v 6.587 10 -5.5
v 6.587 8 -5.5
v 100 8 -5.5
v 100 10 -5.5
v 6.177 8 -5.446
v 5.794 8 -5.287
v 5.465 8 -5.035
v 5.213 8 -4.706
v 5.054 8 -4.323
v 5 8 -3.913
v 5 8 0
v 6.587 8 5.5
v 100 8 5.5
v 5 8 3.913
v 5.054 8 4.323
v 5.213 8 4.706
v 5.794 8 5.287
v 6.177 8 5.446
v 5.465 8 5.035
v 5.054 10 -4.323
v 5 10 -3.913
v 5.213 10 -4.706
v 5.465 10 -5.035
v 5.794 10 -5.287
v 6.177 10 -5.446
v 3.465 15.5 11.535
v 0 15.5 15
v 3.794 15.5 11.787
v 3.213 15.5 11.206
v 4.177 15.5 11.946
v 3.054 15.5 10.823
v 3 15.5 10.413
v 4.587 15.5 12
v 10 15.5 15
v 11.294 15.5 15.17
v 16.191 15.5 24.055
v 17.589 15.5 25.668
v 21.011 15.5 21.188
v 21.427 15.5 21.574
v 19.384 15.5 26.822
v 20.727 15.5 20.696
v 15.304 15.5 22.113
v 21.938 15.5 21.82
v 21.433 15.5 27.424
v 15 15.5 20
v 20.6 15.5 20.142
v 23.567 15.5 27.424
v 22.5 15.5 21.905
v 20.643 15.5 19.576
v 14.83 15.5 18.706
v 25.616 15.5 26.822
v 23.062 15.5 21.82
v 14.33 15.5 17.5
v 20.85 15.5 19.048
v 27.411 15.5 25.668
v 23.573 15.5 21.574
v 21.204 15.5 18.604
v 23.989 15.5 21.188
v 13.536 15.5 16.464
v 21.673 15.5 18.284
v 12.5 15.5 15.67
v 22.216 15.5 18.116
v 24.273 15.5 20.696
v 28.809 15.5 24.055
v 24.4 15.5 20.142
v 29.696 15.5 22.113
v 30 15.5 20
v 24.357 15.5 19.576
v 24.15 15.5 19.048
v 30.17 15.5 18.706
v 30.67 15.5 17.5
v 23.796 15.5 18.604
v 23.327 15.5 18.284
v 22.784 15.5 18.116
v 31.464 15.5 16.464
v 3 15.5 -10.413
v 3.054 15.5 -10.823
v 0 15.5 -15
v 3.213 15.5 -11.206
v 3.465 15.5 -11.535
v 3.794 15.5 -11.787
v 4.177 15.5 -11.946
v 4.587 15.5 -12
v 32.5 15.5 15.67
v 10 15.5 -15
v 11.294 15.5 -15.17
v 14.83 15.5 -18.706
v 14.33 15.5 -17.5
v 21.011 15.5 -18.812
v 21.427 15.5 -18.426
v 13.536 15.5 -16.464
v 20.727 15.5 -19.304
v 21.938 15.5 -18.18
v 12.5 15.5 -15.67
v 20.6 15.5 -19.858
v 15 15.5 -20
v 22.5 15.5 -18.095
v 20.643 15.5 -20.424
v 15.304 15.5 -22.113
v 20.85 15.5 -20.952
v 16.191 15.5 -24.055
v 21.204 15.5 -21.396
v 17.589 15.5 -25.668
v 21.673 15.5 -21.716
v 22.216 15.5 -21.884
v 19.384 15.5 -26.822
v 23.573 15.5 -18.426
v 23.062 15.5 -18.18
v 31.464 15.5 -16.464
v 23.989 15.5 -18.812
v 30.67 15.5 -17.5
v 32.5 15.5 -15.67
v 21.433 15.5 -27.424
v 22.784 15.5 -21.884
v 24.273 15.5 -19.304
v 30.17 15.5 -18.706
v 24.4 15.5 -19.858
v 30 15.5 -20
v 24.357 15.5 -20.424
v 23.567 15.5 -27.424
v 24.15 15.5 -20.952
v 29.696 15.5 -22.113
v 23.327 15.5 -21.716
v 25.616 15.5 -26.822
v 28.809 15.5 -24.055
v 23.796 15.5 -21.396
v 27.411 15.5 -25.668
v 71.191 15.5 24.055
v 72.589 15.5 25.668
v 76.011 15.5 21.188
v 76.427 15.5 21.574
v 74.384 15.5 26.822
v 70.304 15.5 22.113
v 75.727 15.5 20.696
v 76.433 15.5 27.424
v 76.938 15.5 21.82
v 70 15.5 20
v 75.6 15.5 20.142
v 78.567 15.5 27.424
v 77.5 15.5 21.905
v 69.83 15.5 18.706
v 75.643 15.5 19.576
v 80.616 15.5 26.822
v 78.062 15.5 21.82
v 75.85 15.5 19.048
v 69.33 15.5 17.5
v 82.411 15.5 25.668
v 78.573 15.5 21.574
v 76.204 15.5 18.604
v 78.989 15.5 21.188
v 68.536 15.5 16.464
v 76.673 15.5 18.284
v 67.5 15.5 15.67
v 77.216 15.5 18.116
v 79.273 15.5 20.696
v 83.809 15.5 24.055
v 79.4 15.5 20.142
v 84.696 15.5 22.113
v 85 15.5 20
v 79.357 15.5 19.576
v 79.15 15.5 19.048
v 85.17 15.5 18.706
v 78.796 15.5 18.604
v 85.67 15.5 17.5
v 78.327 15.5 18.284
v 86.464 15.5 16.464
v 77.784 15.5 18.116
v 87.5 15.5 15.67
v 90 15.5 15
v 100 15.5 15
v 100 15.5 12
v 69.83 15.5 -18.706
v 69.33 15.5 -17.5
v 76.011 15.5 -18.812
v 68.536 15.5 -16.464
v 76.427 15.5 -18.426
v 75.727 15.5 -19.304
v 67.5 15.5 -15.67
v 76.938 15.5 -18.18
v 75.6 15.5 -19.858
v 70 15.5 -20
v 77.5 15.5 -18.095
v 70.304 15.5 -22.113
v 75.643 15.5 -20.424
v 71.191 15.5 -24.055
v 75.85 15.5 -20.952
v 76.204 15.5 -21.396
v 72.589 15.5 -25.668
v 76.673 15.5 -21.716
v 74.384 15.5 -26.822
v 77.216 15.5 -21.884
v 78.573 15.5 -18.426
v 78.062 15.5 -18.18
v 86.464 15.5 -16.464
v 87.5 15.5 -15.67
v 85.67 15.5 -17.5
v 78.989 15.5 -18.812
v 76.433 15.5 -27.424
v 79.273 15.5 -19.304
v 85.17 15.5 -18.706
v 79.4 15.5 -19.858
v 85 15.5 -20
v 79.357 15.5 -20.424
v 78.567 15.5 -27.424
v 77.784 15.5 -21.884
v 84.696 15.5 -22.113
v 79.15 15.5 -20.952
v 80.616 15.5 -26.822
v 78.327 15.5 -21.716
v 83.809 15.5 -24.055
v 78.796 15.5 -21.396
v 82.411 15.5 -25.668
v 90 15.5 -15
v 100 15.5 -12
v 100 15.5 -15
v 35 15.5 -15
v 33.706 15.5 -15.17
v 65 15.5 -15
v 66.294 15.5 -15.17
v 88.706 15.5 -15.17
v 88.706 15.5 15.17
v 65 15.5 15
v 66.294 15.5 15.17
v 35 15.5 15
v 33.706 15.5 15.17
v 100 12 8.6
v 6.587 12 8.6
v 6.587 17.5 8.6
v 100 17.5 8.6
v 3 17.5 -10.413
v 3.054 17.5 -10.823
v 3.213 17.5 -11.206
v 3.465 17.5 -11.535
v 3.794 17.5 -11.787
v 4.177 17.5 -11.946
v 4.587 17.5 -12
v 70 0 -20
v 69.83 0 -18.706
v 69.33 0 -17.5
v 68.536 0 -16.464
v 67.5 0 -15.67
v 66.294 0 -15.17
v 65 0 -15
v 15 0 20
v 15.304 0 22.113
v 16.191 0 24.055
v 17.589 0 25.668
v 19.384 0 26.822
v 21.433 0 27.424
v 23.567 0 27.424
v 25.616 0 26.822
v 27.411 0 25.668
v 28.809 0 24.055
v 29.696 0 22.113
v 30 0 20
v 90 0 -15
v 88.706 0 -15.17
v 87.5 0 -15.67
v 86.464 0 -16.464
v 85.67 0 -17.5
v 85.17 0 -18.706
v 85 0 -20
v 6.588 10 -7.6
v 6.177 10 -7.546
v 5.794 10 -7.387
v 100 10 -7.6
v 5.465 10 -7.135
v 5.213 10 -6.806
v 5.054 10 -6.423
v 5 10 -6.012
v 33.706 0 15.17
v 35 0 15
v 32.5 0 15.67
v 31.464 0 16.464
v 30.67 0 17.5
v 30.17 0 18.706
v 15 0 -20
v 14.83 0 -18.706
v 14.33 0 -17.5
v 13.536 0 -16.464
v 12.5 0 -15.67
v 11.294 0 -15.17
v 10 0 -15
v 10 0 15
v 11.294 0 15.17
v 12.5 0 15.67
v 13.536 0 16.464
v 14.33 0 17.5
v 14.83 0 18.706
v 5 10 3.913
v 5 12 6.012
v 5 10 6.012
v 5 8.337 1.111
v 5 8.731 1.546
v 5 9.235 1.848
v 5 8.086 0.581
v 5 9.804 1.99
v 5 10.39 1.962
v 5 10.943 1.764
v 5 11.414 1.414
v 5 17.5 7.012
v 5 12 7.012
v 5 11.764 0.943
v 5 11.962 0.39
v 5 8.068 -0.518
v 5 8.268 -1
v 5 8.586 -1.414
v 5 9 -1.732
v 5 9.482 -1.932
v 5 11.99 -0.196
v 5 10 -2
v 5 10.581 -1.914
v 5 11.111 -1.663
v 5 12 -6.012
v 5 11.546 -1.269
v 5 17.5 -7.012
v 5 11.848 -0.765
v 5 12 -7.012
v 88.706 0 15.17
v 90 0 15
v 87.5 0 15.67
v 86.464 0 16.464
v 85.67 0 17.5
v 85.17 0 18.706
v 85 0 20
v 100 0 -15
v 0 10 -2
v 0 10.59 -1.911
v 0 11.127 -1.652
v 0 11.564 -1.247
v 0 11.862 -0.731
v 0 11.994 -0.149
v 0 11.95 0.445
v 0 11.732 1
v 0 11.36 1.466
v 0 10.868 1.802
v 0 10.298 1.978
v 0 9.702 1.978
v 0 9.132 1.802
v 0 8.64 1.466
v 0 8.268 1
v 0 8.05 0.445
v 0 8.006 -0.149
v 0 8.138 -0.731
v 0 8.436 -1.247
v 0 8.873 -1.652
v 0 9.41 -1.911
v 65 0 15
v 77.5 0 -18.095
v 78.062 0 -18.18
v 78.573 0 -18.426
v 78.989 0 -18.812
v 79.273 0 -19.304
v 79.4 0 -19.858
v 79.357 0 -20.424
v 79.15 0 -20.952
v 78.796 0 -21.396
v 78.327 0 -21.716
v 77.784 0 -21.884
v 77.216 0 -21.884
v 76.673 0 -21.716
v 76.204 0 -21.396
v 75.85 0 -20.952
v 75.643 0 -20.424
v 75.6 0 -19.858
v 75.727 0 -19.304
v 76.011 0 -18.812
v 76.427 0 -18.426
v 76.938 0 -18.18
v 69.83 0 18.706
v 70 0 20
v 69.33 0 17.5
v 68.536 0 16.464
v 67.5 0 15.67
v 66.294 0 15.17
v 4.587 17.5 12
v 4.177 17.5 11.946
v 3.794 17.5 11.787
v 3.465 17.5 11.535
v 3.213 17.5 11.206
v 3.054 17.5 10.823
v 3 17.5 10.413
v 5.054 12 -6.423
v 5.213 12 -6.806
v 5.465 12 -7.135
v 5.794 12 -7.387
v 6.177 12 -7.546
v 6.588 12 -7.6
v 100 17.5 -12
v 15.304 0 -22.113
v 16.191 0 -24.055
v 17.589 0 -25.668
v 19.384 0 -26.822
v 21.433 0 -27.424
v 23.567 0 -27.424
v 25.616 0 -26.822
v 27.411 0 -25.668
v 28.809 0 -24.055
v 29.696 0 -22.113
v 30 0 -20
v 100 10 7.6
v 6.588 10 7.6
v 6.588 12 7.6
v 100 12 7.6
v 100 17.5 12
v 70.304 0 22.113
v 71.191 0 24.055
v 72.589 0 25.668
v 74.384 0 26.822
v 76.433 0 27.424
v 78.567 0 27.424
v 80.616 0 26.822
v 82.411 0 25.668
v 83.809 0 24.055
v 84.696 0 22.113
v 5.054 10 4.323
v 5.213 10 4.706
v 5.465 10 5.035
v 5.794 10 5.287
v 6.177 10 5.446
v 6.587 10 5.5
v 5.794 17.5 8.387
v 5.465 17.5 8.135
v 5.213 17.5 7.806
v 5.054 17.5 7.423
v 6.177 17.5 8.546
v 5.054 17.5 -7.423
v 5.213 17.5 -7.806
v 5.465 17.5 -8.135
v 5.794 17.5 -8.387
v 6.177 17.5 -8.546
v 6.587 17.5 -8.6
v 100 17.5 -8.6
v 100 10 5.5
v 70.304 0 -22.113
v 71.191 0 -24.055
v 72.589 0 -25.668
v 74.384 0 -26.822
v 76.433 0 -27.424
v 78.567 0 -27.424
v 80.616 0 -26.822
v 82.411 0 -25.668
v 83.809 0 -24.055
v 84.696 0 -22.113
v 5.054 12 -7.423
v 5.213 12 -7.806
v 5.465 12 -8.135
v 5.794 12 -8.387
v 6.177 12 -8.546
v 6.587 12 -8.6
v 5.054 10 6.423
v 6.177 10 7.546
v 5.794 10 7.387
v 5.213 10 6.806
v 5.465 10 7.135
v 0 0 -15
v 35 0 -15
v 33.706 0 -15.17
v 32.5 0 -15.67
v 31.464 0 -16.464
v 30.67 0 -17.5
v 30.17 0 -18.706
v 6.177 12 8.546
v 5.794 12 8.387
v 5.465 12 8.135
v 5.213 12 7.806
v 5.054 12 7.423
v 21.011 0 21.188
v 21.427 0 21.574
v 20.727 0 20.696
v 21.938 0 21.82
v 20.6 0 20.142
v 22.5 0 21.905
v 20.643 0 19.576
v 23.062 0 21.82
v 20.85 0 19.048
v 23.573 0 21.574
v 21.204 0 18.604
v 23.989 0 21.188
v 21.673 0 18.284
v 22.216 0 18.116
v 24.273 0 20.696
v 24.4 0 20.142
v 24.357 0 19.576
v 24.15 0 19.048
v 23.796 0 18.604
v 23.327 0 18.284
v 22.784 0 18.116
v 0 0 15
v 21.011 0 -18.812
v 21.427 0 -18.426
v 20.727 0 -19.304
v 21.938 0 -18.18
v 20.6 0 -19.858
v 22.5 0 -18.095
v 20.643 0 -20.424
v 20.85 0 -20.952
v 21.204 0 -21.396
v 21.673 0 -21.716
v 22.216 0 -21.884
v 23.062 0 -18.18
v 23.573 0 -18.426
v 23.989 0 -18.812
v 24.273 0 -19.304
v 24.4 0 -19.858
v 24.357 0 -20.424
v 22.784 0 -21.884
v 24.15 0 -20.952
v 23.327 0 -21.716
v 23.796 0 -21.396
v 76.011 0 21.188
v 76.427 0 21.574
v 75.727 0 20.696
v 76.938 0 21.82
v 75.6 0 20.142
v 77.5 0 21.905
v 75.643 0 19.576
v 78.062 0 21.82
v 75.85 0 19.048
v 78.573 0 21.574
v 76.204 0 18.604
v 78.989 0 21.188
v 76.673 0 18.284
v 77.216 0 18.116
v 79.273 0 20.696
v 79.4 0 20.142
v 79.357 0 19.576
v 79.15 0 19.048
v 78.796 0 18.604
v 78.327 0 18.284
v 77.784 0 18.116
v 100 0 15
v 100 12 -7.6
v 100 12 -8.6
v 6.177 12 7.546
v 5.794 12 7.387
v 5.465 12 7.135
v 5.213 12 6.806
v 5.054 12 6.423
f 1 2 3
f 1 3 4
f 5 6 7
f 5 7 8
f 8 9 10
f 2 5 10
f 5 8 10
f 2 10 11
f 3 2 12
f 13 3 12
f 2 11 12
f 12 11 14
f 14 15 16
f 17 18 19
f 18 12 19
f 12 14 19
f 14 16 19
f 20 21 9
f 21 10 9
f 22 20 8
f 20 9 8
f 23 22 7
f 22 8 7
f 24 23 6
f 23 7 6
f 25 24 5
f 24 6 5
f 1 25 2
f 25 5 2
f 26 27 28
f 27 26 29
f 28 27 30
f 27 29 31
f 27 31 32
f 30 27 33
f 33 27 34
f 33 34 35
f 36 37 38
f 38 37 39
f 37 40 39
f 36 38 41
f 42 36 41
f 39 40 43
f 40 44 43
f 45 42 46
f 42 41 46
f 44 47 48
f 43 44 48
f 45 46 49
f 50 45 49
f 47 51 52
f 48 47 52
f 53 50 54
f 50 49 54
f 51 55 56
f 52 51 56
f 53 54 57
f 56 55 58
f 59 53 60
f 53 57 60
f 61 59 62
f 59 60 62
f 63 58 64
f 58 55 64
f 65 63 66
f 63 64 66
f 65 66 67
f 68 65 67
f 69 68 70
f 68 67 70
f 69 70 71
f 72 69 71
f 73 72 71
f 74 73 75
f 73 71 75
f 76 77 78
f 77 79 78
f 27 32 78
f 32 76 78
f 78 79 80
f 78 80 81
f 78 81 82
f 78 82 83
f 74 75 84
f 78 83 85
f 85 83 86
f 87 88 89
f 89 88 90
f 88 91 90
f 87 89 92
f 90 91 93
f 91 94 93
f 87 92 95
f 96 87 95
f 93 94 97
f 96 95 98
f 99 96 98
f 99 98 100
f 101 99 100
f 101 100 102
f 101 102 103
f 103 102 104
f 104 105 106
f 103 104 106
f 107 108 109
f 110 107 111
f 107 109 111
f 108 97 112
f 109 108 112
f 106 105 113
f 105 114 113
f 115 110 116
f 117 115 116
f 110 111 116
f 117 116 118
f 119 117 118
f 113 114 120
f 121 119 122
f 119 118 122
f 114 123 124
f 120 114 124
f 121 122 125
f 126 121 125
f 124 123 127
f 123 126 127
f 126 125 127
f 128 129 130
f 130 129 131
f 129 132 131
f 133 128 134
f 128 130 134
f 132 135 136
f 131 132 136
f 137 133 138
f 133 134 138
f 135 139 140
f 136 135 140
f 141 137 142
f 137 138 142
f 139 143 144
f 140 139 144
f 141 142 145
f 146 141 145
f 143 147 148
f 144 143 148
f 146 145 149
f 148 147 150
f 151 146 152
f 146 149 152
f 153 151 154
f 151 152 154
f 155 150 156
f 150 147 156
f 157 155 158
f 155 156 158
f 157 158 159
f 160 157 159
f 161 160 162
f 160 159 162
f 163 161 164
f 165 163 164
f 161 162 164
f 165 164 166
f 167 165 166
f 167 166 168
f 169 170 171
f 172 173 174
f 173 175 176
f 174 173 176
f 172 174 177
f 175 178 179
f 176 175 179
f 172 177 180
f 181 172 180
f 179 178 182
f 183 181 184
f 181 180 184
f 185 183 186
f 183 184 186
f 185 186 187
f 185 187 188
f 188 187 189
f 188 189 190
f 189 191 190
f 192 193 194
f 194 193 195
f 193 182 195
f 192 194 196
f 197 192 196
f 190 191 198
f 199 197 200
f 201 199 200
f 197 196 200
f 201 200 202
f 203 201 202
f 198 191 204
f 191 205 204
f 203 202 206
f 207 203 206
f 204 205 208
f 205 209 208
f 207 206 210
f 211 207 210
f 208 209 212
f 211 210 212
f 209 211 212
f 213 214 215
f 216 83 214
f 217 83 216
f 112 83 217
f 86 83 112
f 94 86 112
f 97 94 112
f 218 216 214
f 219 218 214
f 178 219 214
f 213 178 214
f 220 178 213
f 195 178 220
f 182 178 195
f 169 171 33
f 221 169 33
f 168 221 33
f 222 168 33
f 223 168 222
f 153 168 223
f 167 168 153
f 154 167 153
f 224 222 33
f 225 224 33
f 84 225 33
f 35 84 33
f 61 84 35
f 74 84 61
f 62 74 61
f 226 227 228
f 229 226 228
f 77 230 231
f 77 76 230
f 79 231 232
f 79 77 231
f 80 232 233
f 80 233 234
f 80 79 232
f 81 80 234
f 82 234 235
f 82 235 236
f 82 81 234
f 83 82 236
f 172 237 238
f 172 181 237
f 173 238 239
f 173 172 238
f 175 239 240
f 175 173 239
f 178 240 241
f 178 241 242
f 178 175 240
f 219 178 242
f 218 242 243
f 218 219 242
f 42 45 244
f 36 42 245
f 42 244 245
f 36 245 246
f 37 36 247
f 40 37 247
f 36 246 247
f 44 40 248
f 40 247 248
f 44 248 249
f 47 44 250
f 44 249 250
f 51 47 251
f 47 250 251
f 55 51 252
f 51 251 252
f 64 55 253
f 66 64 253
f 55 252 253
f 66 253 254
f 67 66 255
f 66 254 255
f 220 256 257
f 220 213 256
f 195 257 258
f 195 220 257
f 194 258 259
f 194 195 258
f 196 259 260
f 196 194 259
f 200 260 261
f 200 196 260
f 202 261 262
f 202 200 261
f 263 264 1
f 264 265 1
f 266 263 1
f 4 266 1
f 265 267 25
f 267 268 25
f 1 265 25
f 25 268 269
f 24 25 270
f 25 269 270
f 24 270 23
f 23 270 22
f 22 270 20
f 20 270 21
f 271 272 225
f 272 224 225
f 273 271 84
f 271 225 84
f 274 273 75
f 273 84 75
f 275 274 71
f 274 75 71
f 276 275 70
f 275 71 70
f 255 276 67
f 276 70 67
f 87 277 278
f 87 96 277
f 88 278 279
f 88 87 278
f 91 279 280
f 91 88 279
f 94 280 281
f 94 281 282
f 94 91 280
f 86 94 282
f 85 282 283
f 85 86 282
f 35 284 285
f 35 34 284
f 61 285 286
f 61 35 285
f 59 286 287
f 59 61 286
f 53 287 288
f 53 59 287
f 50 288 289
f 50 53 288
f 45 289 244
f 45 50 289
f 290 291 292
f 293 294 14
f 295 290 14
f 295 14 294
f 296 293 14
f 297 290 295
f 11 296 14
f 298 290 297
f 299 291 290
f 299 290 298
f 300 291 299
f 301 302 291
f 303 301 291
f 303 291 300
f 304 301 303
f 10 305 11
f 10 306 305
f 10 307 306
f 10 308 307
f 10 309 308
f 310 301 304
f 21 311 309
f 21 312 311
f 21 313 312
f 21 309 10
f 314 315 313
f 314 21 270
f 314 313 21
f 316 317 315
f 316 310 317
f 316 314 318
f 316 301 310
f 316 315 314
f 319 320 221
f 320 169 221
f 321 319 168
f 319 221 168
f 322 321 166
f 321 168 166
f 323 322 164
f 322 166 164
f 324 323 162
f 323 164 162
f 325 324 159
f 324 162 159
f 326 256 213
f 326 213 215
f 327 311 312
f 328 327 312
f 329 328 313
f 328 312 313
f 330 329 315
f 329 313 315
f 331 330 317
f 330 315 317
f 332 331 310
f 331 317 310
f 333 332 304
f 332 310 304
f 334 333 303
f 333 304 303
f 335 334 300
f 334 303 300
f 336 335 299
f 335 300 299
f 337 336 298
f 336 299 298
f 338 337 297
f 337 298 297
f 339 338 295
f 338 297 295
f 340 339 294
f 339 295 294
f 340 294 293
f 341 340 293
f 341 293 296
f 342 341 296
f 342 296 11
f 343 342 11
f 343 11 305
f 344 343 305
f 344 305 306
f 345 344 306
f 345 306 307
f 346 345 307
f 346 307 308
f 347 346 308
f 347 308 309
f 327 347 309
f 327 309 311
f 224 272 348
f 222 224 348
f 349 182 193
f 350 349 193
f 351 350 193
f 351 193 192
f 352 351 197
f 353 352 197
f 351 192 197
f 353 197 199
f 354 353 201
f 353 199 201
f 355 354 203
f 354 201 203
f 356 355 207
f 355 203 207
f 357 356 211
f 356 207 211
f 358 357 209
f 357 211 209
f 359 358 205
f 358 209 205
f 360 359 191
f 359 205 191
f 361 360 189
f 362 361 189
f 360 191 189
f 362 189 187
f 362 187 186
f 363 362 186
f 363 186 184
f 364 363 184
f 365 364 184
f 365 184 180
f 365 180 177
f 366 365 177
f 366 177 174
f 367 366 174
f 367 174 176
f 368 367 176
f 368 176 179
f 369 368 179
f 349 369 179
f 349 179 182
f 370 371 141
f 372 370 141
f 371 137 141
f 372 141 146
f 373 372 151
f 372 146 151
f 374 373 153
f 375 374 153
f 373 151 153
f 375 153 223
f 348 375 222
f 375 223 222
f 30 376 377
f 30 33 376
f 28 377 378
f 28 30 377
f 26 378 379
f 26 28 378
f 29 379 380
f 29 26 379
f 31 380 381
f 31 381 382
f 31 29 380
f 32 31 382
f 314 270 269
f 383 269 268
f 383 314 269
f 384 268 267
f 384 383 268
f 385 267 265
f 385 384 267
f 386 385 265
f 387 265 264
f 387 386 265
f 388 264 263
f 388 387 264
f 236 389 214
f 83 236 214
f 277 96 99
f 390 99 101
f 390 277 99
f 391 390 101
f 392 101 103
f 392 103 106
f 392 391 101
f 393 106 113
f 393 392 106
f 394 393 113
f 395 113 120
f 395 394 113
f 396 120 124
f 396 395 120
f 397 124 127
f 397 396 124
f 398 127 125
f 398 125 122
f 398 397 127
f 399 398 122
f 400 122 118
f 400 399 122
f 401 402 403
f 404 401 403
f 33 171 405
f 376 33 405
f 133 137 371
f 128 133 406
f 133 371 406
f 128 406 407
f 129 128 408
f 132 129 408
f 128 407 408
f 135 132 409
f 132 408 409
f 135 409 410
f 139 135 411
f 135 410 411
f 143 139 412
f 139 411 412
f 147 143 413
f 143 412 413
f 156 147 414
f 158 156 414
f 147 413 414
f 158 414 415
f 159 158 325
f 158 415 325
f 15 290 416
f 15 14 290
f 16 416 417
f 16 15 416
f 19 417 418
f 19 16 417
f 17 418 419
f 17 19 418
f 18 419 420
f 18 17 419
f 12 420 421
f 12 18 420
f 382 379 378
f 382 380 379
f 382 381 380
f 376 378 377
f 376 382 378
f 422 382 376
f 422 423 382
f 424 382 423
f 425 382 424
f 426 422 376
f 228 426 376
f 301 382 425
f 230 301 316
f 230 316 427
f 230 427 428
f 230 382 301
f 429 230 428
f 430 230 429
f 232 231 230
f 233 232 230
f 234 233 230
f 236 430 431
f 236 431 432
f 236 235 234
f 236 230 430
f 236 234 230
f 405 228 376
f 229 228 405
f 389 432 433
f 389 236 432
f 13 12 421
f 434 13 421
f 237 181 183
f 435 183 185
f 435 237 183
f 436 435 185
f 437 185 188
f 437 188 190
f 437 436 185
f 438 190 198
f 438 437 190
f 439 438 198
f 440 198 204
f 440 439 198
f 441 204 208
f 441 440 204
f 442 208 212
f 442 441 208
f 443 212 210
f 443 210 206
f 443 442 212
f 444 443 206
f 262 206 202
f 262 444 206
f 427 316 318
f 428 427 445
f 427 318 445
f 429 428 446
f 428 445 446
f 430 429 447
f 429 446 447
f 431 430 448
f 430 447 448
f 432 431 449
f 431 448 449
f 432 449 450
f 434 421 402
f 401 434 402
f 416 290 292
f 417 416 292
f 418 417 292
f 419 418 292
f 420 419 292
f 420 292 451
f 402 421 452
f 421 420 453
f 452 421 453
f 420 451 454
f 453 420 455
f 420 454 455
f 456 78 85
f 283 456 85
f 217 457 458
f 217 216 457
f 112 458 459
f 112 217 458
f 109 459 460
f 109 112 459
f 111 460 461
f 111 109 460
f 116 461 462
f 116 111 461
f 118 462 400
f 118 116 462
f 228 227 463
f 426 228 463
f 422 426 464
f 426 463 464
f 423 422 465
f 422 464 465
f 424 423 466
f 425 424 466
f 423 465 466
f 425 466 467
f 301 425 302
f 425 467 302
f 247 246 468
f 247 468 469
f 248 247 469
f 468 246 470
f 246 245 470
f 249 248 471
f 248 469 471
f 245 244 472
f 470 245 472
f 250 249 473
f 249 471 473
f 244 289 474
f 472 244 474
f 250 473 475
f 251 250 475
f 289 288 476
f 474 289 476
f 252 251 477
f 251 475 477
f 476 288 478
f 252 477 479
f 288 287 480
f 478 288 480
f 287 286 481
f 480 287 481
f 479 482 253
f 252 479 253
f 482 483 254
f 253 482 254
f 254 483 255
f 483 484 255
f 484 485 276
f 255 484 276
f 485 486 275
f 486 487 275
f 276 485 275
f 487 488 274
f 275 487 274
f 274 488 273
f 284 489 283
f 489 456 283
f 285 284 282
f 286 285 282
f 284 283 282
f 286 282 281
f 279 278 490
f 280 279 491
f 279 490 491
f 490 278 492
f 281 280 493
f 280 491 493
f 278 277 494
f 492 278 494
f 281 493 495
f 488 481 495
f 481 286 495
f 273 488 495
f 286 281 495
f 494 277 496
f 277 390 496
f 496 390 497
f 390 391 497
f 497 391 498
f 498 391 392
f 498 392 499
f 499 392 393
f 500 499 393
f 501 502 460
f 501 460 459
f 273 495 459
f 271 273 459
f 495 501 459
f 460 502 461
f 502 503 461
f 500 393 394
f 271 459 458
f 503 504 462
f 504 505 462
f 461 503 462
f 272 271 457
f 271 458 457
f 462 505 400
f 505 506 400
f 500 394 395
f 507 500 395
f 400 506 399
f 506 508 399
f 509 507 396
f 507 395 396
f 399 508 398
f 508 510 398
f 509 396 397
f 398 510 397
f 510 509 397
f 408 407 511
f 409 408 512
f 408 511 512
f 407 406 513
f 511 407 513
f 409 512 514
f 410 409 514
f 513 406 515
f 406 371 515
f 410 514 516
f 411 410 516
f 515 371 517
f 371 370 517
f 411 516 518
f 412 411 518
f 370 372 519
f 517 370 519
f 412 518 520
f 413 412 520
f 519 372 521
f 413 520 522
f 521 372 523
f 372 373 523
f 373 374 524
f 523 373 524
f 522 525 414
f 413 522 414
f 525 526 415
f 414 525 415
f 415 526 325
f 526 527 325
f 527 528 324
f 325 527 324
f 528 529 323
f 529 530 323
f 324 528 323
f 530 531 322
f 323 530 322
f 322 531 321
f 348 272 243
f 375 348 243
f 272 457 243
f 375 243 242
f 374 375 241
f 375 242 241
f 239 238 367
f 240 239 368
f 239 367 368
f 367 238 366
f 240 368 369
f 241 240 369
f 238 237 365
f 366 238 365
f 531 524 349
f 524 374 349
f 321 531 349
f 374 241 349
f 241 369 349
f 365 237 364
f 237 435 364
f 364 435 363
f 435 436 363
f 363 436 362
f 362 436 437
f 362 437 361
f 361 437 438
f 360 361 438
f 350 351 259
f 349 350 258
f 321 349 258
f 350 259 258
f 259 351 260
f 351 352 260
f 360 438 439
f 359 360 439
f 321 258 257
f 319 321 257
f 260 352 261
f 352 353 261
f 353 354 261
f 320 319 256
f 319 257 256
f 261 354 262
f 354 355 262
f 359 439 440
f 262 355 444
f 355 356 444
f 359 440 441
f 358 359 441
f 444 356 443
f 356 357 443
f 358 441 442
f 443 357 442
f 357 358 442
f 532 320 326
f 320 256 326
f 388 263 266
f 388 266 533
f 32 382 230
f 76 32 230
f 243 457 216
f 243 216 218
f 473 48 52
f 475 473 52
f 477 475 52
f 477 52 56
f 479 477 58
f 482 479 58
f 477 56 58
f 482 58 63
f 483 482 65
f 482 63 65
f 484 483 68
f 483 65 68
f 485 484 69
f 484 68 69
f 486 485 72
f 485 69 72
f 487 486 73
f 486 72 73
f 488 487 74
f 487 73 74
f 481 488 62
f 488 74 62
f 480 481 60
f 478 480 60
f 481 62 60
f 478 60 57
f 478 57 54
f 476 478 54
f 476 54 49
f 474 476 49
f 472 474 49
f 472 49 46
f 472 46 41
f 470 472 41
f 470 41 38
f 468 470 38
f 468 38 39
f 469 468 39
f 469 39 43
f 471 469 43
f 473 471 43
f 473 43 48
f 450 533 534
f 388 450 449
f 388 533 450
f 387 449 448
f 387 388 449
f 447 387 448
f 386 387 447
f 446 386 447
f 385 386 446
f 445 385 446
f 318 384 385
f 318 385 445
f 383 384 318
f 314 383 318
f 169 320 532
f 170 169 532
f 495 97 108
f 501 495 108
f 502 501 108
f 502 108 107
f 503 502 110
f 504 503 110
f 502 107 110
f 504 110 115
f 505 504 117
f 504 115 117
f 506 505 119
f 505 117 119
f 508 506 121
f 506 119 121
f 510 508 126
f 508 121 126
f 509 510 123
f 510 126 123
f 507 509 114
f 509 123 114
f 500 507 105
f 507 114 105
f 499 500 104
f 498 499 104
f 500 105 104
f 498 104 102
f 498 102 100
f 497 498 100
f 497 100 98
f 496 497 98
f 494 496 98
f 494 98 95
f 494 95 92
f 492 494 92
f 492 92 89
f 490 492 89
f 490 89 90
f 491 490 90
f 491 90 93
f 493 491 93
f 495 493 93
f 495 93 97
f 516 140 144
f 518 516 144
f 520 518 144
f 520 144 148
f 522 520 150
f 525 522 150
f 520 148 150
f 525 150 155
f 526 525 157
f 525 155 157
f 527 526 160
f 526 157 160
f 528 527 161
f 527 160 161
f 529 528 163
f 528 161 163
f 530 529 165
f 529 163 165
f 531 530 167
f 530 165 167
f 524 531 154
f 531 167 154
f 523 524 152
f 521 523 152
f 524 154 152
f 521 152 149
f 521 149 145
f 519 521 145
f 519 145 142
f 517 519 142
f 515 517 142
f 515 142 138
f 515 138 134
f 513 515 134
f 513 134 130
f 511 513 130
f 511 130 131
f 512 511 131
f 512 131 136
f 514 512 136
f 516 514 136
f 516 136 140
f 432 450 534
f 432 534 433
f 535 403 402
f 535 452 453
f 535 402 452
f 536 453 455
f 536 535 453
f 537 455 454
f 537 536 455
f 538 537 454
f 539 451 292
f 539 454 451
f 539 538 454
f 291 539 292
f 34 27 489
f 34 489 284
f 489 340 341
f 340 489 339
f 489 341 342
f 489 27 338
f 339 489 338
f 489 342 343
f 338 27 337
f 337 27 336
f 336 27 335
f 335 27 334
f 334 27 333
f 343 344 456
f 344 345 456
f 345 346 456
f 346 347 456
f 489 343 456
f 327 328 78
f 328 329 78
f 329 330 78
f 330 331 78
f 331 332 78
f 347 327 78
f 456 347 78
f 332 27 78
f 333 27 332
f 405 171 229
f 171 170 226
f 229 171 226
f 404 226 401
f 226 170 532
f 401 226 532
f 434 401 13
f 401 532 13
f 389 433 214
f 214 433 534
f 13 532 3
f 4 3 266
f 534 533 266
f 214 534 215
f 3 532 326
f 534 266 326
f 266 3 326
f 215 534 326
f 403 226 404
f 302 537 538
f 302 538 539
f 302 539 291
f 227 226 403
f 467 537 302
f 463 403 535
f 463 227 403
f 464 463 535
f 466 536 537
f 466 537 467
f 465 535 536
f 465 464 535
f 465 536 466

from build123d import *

# Parameters (mm, degrees)
SKETCH1_W           = 100
SKETCH1_H           = 30
BOSS_EXTRUDE1_DEPTH = 20
SKETCH2_W           = 15.2
SKETCH2_H           = 15.5
CUT_EXTRUDE1_DEPTH  = 104.07764064
SKETCH3_W           = 11
SKETCH3_H           = 2
CUT_EXTRUDE2_DEPTH  = 104.07764064
SKETCH4_W           = 1
SKETCH4_H           = 8
CUT_EXTRUDE3_DEPTH  = 104.07764064
CUT_EXTRUDE4_DEPTH  = 104.07764064
BOSS_EXTRUDE2_REACH = 104.622
SKETCH6_W           = 5
SKETCH6_H           = 17.2
FILLET1_R           = 1.5875
FILLET2_R           = 1.5875
SKETCH7_W           = 3
SKETCH7_H           = 24
CUT_EXTRUDE5_DEPTH  = 2
FILLET3_R           = 1.5875
BOSS_EXTRUDE3_DEPTH = 15.5
SKETCH9_R           = 1.905
CUT_EXTRUDE6_DEPTH  = 105.864197894
FILLET4_R           = 5
SKETCH10_R          = 2
CUT_EXTRUDE7_DEPTH  = 101.436547133


# Some blends are built 0.0001 mm under size
with BuildPart() as part:
    # Sketch1 → Boss-Extrude1 (new body)
    with BuildSketch(Plane(origin=(0, 0, 0), x_dir=(1, 0, 0), z_dir=(0, 1, 0))):
        with Locations((50, 0)):
            Rectangle(SKETCH1_W, SKETCH1_H)
    extrude(amount=BOSS_EXTRUDE1_DEPTH)

    # Sketch2 → Cut-Extrude1 (cut, through all)
    with BuildSketch(Plane.ZY):
        with Locations((0, 17.75)):
            Rectangle(SKETCH2_W, SKETCH2_H)
    extrude(amount=-CUT_EXTRUDE1_DEPTH, mode=Mode.SUBTRACT)

    # Sketch3 → Cut-Extrude2 (cut, through all)
    with BuildSketch(Plane.ZY):
        with Locations((0, 9)):
            Rectangle(SKETCH3_W, SKETCH3_H)
    extrude(amount=-CUT_EXTRUDE2_DEPTH, mode=Mode.SUBTRACT)

    # Sketch4 → Cut-Extrude3 (cut, through all)
    with BuildSketch(Plane.ZY):
        with Locations((8.1, 16)):
            Rectangle(SKETCH4_W, SKETCH4_H)
        with Locations((-8.1, 16)):
            Rectangle(SKETCH4_W, SKETCH4_H)
    extrude(amount=-CUT_EXTRUDE3_DEPTH, mode=Mode.SUBTRACT)

    # Sketch5 → Cut-Extrude4 (cut, through all)
    with BuildSketch(Plane(origin=(100, 0, 0), x_dir=(0, 0, -1), z_dir=(1, 0, 0))):
        Polygon((-12, 17.5), (12, 17.5), (12, 15.5), (15, 15.5), (15, 17.5), (15, 20), (-15, 20), (-15, 17.5), (-15, 15.5), (-12, 15.5), align=None)
    extrude(amount=-CUT_EXTRUDE4_DEPTH, mode=Mode.SUBTRACT)

    # Sketch6 → Boss-Extrude2 (add, up to next)
    with BuildSketch(Plane(origin=(0, 17.5, 0), x_dir=(1, 0, 0), z_dir=(0, 1, 0)), mode=Mode.PRIVATE) as boss_extrude2_sk1:
        with Locations((2.5, 0)):
            Rectangle(SKETCH6_W, SKETCH6_H)
    boss_extrude2_tool1 = extrude(boss_extrude2_sk1.sketch, amount=-BOSS_EXTRUDE2_REACH, mode=Mode.PRIVATE) - part.part
    add(boss_extrude2_tool1.solids().sort_by_distance((2.5, 17.5, 0))[0])

    # Fillet1
    fillet1_edges = [part.edges().sort_by_distance(p)[0] for p in [
        (5, 9, 5.5),
        (5, 14.75, 8.6),
        (5, 9, -5.5),
        (5, 14.75, -8.6),
    ]]
    fillet(fillet1_edges, radius=FILLET1_R)

    # Fillet2
    # the kernel refuses this fillet: 1.5875 mm, written as the material it adds along each edge
    with BuildSketch(Plane(origin=(5.11271188, 12, 7.6), x_dir=(1, 0, 0), z_dir=(0, -1, 0))) as fillet2_piece_1:
        with BuildLine():
            CenterArc((1.47478812, -1.5875), FILLET2_R, 90, 90)
            Line((-0.11271188, -1.5875), (-0.27146188, -1.5875))
            ThreePointArc((-0.27146188, -1.5875), (-0.27146188, -0.5875), (-0.147478812, 0.05875))
            Line((-0.147478812, 0.05875), (0, 0.15875))
            Line((0, 0.15875), (1.47478812, 0.15875))
            Line((1.47478812, 0.15875), (1.47478812, 0))
        make_face()
    extrude(amount=5.97874055)
    with BuildSketch(Plane(origin=(5.11271188, 12, -7.6), x_dir=(1, 0, 0), z_dir=(0, -1, 0))) as fillet2_piece_2:
        with BuildLine():
            CenterArc((1.47478812, 1.5875), FILLET2_R, 180, 90)
            Line((-0.11271188, 1.5875), (-0.27146188, 1.5875))
            ThreePointArc((-0.27146188, 1.5875), (-0.27146188, 0.5875), (-0.147478812, -0.05875))
            Line((-0.147478812, -0.05875), (0, -0.15875))
            Line((0, -0.15875), (1.47478812, -0.15875))
            Line((1.47478812, -0.15875), (1.47478812, 0))
        make_face()
    extrude(amount=5.97874055)

    # Sketch7 → Cut-Extrude5 (cut)
    with BuildSketch(Plane(origin=(0, 17.5, 0), x_dir=(1, 0, 0), z_dir=(0, 1, 0))):
        with Locations((1.5, 0)):
            Rectangle(SKETCH7_W, SKETCH7_H)
    extrude(amount=-CUT_EXTRUDE5_DEPTH, mode=Mode.SUBTRACT)

    # Fillet3
    fillet3_edges = [part.edges().sort_by_distance(p)[0] for p in [
        (3, 16.5, 12),
        (3, 16.5, -12),
    ]]
    fillet(fillet3_edges, radius=FILLET3_R)

    # Sketch8 → Boss-Extrude3 (add)
    with BuildSketch(Plane.XZ):
        with BuildLine():
            Line((15, 15), (15, 20))
            ThreePointArc((15, 20), (22.5, 27.5), (30, 20))
            Line((30, 20), (30, 15))
            Line((30, 15), (15, 15))
        make_face()
        with BuildLine():
            Line((70, 15), (70, 20))
            ThreePointArc((70, 20), (77.5, 27.5), (85, 20))
            Line((85, 20), (85, 15))
            Line((85, 15), (70, 15))
        make_face()
    boss_extrude3 = extrude(amount=-BOSS_EXTRUDE3_DEPTH)

    # Mirror1: Boss-Extrude3 across plane
    add(boss_extrude3.mirror(Plane.XY))

    # Sketch9 → Cut-Extrude6 (cut, through all)
    with BuildSketch(Plane(origin=(0, 15.5, 0), x_dir=(1, 0, 0), z_dir=(0, 1, 0))):
        with Locations(Location((22.5, 20, 0), (0, 0, 270))):
            Circle(SKETCH9_R)
        with Locations(Location((77.5, 20, 0), (0, 0, 270))):
            Circle(SKETCH9_R)
        with Locations(Location((77.5, -20, 0), (0, 0, 270))):
            Circle(SKETCH9_R)
        with Locations(Location((22.5, -20, 0), (0, 0, 270))):
            Circle(SKETCH9_R)
    extrude(amount=-CUT_EXTRUDE6_DEPTH, mode=Mode.SUBTRACT)

    # Fillet4
    fillet4_edges = [part.edges().sort_by_distance(p)[0] for p in [
        (15, 7.75, 15),
        (30, 7.75, 15),
        (70, 7.75, 15),
        (85, 7.75, 15),
        (85, 7.75, -15),
        (70, 7.75, -15),
        (30, 7.75, -15),
        (15, 7.75, -15),
    ]]
    fillet(fillet4_edges, radius=FILLET4_R - 0.0001)  # a hair under: the kernel refuses the full size

    # Sketch10 → Cut-Extrude7 (cut, through all)
    with BuildSketch(Plane(origin=(5, 0, 0), x_dir=(0, 0, -1), z_dir=(1, 0, 0))):
        with Locations((0, 10)):
            Circle(SKETCH10_R)
    extrude(amount=-CUT_EXTRUDE7_DEPTH, mode=Mode.SUBTRACT)


solid = part.part
